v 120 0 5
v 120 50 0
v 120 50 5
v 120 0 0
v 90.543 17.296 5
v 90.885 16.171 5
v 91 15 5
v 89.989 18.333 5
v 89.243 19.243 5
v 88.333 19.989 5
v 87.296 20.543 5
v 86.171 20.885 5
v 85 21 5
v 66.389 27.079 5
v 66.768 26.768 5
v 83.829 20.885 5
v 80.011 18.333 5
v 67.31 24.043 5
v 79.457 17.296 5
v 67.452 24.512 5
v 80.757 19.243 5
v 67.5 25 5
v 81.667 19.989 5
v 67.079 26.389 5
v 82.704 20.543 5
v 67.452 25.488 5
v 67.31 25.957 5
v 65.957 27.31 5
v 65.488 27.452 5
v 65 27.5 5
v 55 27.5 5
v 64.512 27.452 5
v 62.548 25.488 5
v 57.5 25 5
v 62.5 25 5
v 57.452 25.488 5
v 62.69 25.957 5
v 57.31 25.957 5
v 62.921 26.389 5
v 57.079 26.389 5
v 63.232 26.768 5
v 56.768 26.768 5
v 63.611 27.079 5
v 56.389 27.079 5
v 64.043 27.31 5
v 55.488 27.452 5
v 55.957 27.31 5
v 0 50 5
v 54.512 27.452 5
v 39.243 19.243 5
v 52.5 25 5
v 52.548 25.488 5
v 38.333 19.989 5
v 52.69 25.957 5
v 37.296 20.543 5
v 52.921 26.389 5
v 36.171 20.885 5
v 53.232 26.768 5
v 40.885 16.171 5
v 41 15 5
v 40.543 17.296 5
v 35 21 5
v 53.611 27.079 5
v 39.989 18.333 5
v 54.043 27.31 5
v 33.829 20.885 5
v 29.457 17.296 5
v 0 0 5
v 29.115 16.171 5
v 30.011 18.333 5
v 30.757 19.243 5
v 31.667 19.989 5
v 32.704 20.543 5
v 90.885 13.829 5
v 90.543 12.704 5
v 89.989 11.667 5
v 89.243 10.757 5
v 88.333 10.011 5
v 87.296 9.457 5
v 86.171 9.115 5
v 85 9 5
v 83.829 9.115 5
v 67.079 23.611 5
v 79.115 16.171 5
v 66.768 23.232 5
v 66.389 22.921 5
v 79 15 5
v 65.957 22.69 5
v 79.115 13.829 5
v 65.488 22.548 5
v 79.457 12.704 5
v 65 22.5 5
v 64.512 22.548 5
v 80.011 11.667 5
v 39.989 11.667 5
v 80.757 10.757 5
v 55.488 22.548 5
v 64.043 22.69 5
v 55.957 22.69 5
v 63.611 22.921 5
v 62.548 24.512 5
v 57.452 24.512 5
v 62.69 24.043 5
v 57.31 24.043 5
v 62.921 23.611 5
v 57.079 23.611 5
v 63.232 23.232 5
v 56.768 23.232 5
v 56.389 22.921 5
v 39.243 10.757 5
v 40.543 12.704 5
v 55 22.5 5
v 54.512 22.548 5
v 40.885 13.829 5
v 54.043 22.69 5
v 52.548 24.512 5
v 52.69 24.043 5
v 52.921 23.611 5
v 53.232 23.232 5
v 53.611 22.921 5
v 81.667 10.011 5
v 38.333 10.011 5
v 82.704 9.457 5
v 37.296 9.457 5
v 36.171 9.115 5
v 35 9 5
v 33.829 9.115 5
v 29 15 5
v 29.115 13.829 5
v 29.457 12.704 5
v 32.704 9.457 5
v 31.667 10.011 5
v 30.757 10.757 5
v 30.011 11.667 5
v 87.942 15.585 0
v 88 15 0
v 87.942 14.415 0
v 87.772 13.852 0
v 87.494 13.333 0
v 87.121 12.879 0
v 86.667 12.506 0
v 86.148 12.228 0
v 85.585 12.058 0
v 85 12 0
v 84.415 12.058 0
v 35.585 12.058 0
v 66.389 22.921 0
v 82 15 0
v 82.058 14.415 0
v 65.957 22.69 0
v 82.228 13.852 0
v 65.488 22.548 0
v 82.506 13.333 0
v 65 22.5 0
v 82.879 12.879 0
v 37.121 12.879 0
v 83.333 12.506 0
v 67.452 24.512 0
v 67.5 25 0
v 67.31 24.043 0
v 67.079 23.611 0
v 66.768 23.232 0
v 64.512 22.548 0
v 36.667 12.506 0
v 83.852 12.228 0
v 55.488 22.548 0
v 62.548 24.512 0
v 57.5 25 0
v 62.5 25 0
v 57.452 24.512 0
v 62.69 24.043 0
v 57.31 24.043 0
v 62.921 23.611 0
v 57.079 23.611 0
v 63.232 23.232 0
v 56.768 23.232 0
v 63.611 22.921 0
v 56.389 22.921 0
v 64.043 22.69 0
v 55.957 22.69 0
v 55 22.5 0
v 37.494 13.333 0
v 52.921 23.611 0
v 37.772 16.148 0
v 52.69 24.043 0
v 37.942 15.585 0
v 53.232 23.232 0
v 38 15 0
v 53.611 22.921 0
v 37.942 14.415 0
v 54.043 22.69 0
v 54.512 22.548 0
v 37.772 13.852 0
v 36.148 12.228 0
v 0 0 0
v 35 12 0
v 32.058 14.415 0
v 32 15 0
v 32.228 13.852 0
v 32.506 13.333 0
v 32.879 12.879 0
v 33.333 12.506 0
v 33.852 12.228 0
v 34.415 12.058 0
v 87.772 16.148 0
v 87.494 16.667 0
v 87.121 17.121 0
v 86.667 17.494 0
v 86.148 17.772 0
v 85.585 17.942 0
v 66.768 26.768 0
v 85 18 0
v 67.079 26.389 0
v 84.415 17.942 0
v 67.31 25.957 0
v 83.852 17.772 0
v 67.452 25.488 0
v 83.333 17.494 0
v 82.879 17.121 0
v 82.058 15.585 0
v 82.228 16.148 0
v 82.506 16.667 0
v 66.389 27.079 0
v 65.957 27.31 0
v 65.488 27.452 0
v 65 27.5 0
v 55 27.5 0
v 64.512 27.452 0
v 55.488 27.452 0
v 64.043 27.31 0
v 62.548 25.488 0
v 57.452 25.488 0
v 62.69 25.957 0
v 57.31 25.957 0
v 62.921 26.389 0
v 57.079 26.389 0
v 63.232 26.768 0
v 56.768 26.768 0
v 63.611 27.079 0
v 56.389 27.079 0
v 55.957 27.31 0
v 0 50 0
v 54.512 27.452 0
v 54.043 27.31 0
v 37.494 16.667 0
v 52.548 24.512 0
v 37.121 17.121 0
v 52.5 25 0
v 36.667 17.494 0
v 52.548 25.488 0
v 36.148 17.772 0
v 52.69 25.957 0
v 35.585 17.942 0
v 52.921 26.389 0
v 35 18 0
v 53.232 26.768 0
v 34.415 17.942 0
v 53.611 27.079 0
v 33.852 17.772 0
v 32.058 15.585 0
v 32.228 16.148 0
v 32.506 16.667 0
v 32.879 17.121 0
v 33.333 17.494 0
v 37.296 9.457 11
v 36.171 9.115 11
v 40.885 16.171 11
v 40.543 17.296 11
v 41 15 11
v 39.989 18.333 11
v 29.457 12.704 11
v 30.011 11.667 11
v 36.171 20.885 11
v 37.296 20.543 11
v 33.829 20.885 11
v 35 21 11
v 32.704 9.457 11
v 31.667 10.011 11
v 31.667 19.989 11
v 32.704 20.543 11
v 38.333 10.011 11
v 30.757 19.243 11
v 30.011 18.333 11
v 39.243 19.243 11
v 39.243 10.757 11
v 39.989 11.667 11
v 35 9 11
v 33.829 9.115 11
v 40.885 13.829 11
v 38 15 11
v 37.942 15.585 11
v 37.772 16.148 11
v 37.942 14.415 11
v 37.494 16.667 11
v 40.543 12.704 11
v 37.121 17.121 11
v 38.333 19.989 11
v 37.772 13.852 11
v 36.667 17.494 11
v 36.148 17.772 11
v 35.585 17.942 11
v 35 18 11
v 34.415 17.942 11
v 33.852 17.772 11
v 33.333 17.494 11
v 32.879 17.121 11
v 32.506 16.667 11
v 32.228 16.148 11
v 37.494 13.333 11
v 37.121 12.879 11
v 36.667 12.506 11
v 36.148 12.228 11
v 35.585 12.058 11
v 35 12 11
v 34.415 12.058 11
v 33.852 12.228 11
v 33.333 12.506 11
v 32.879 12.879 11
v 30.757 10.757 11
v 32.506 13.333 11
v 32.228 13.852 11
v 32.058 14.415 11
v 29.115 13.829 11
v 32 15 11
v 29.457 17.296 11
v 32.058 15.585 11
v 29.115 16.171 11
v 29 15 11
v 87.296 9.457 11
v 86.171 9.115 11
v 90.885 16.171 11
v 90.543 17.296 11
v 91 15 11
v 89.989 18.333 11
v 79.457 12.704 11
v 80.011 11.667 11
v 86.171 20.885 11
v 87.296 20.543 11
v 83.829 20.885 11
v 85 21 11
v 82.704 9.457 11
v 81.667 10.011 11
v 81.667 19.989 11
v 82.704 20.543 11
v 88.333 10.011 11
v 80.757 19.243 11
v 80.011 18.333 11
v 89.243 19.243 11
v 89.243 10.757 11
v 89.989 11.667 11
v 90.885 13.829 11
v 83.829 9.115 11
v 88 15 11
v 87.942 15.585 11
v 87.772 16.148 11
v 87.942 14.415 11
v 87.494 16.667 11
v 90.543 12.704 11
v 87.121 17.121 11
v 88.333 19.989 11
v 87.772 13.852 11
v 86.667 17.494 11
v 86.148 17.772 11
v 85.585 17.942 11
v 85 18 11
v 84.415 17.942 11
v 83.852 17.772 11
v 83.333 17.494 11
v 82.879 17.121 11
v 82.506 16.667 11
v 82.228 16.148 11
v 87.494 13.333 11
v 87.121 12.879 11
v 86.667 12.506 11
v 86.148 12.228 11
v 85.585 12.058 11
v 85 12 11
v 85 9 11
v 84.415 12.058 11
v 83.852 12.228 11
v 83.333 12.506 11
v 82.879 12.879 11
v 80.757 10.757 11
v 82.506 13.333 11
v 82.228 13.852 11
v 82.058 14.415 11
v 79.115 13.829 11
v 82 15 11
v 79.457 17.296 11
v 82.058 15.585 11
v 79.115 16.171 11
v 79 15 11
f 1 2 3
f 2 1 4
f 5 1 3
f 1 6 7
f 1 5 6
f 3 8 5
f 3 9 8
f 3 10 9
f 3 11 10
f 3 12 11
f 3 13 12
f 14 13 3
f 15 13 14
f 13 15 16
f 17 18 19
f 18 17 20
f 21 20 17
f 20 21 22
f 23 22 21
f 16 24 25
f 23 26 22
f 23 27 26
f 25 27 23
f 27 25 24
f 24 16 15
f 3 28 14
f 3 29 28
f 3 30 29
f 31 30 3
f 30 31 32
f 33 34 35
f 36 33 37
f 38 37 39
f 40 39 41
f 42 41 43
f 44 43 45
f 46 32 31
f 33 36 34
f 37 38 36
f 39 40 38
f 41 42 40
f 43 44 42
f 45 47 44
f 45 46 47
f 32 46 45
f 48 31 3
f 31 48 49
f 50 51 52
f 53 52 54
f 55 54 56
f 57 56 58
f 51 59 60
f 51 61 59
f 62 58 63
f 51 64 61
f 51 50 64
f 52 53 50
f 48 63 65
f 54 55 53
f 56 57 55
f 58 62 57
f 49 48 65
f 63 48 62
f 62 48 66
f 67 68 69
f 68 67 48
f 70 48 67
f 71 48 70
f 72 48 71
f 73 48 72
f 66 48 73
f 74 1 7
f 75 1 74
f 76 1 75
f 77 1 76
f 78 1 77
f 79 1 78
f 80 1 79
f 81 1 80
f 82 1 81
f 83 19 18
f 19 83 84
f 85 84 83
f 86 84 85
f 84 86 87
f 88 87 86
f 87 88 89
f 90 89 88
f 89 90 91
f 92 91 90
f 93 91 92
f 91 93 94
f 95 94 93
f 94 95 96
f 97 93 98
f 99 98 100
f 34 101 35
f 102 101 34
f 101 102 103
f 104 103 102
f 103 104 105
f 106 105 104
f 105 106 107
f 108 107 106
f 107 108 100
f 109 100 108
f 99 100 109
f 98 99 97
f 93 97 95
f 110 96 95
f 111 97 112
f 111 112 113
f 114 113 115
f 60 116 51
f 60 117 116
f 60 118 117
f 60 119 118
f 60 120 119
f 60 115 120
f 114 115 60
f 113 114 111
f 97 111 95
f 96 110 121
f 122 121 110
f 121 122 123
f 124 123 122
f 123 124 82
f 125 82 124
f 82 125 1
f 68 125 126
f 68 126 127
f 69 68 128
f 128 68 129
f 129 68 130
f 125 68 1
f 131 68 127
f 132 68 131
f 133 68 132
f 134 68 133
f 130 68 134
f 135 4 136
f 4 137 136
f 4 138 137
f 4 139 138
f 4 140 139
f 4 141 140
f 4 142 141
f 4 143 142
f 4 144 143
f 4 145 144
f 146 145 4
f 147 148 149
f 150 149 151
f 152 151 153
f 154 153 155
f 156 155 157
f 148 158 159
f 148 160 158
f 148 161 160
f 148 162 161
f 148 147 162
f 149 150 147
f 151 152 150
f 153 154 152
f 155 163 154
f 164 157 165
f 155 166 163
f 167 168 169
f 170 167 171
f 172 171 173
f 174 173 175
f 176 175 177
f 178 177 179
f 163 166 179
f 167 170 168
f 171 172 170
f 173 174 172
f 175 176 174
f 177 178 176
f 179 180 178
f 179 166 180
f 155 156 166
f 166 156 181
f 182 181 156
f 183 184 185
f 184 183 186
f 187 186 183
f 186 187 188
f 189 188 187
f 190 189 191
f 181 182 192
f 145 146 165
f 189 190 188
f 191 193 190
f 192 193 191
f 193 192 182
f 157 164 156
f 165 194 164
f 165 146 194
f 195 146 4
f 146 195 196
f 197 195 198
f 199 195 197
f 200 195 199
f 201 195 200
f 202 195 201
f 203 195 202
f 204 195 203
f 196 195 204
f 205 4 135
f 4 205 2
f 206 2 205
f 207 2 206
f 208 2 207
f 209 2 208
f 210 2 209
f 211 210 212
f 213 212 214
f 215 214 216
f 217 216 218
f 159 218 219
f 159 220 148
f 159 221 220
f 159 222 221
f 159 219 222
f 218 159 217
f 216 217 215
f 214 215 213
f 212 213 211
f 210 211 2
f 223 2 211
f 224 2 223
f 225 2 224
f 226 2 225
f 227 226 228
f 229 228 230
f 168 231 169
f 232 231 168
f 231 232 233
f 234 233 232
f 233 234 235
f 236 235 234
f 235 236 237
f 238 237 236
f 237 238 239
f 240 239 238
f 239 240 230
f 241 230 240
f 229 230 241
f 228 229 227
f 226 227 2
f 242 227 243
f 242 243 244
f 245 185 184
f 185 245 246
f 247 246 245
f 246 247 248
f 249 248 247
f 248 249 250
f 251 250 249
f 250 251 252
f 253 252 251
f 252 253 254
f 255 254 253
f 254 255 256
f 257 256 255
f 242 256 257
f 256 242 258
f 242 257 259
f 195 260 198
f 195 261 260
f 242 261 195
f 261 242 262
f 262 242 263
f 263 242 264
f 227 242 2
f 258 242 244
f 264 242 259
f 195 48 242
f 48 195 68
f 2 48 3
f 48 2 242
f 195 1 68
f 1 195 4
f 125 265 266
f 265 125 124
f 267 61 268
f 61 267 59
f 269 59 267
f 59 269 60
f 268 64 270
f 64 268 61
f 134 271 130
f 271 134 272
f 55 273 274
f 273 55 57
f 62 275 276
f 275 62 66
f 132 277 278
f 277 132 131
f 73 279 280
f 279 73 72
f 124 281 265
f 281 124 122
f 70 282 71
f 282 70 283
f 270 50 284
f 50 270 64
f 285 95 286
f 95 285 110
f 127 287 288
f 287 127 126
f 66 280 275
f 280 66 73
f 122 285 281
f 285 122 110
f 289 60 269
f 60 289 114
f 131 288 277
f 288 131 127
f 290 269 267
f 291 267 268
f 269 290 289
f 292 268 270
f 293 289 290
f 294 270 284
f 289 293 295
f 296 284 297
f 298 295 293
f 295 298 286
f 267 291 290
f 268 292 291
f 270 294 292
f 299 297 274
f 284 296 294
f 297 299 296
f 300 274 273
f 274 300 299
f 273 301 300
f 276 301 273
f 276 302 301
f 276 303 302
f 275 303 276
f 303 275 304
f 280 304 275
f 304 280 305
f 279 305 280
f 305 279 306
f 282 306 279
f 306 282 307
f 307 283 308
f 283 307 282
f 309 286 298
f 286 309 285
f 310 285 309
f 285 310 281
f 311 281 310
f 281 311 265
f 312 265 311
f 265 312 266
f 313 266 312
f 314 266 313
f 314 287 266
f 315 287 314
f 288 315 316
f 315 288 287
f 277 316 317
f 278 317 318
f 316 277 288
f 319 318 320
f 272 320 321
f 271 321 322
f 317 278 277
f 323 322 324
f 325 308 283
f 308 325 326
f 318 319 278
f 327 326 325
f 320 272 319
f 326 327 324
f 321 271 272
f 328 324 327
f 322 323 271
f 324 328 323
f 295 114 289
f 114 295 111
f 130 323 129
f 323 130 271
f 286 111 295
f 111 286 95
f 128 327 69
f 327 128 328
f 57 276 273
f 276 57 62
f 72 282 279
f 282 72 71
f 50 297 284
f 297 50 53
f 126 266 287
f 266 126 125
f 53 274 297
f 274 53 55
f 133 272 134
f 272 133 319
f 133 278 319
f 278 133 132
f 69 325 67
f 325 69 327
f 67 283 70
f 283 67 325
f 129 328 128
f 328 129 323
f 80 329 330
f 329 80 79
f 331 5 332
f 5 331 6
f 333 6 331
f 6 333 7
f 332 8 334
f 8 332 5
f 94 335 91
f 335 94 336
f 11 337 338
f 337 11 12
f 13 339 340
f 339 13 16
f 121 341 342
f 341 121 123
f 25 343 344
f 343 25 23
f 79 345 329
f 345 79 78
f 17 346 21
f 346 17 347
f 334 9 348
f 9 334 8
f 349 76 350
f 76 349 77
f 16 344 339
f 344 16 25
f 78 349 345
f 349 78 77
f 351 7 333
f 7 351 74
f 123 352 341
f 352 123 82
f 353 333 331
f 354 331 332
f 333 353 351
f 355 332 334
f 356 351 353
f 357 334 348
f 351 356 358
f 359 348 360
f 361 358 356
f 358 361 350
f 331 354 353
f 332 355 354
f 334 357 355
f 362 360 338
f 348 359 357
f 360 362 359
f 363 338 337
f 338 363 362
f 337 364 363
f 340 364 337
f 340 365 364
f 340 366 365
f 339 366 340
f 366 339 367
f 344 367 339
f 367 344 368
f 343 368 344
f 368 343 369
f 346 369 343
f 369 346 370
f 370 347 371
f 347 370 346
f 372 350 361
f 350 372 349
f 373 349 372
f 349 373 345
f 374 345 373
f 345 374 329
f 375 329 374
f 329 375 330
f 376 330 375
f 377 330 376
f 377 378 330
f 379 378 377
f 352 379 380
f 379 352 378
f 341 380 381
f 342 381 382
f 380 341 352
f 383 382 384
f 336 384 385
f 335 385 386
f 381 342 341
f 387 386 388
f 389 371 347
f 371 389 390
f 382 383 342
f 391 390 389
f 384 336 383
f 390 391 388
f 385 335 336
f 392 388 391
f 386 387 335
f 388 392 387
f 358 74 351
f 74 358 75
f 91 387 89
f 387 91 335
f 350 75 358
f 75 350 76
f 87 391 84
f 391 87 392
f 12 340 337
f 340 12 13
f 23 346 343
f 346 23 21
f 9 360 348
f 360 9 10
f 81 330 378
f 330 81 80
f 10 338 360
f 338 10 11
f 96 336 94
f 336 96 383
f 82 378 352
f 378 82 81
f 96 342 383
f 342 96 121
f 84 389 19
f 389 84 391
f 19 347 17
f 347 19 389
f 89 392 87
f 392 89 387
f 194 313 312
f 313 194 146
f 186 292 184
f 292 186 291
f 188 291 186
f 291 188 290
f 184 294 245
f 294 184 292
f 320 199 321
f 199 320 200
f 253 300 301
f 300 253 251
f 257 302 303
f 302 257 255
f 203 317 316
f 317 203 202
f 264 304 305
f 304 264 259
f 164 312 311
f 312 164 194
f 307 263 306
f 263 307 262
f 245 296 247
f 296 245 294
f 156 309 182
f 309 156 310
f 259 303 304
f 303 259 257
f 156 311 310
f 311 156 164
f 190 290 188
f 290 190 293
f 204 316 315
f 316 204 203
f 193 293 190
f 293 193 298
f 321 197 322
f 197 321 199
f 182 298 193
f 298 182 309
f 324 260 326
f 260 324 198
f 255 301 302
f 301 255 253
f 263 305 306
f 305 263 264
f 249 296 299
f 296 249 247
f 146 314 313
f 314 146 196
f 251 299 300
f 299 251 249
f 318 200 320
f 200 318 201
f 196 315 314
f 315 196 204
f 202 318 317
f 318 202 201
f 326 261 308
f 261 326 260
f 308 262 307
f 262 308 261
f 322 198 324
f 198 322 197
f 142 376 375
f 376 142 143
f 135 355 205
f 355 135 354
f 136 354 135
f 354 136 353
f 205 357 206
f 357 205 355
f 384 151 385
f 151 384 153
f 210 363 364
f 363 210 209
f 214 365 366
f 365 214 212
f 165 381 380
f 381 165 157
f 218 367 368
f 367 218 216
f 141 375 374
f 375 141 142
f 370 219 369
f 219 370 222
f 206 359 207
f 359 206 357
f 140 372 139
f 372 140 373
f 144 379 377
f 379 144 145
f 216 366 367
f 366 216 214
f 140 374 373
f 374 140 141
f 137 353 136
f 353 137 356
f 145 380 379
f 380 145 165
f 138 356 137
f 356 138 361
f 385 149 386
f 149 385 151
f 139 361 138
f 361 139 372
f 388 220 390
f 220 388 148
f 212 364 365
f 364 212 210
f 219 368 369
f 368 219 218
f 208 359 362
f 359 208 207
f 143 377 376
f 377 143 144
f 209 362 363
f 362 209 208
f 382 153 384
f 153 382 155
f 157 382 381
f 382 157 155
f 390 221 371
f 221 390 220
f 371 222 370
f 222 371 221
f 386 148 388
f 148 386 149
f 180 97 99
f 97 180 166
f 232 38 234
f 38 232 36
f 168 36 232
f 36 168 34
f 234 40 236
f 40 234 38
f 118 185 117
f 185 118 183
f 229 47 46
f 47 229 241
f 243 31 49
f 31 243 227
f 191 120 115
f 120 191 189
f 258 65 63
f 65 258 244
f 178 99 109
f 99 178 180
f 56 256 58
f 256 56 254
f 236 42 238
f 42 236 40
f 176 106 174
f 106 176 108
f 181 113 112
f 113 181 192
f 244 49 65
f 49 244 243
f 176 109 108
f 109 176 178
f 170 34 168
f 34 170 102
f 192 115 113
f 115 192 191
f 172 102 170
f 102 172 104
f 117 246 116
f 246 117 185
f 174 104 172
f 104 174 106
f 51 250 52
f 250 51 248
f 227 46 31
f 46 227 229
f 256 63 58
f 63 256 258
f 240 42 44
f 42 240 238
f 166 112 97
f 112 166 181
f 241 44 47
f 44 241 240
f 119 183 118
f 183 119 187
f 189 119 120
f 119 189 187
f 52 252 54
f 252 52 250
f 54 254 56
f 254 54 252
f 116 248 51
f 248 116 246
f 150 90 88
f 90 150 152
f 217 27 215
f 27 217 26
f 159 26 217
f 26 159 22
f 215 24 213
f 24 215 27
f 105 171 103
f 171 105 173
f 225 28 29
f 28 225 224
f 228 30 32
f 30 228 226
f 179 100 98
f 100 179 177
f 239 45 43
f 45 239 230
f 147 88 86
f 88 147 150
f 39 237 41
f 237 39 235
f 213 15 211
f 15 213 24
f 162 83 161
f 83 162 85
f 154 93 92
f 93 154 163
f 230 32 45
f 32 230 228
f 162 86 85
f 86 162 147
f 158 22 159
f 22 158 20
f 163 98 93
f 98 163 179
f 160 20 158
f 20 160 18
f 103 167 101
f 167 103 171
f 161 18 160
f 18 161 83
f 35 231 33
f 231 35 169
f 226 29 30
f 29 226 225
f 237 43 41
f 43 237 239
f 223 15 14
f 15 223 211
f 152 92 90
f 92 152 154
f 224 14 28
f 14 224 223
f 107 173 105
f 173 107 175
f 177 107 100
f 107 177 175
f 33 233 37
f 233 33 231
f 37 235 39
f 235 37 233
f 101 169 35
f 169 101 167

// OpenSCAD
$fn = 32;

// ----------------------------------------------------------------------
// Mixed field: bosses and holes at given coordinates
// ----------------------------------------------------------------------

// --- parameters (mm) ---
plate_l = 120;            // plate length, X
plate_w = 50;             // plate width, Y
plate_t = 5;              // plate thickness, Z
boss_d = 12;              // boss diameter
boss_h = 6;               // boss height above the plate
hole_d = 5;               // through hole diameter

total_h = plate_t + boss_h;  // overall height

difference() {
  union() {
    cube([plate_l, plate_w, plate_t]);
    translate([35, 15, plate_t]) cylinder(h = boss_h, d = boss_d);
    translate([85, 15, plate_t]) cylinder(h = boss_h, d = boss_d);
  }
  translate([35, 15, -1]) cylinder(h = total_h + 2, d = boss_d / 2);
  translate([85, 15, -1]) cylinder(h = total_h + 2, d = boss_d / 2);
  translate([55, 25, -1]) cylinder(h = plate_t + 2, d = hole_d);
  translate([65, 25, -1]) cylinder(h = plate_t + 2, d = hole_d);
}
